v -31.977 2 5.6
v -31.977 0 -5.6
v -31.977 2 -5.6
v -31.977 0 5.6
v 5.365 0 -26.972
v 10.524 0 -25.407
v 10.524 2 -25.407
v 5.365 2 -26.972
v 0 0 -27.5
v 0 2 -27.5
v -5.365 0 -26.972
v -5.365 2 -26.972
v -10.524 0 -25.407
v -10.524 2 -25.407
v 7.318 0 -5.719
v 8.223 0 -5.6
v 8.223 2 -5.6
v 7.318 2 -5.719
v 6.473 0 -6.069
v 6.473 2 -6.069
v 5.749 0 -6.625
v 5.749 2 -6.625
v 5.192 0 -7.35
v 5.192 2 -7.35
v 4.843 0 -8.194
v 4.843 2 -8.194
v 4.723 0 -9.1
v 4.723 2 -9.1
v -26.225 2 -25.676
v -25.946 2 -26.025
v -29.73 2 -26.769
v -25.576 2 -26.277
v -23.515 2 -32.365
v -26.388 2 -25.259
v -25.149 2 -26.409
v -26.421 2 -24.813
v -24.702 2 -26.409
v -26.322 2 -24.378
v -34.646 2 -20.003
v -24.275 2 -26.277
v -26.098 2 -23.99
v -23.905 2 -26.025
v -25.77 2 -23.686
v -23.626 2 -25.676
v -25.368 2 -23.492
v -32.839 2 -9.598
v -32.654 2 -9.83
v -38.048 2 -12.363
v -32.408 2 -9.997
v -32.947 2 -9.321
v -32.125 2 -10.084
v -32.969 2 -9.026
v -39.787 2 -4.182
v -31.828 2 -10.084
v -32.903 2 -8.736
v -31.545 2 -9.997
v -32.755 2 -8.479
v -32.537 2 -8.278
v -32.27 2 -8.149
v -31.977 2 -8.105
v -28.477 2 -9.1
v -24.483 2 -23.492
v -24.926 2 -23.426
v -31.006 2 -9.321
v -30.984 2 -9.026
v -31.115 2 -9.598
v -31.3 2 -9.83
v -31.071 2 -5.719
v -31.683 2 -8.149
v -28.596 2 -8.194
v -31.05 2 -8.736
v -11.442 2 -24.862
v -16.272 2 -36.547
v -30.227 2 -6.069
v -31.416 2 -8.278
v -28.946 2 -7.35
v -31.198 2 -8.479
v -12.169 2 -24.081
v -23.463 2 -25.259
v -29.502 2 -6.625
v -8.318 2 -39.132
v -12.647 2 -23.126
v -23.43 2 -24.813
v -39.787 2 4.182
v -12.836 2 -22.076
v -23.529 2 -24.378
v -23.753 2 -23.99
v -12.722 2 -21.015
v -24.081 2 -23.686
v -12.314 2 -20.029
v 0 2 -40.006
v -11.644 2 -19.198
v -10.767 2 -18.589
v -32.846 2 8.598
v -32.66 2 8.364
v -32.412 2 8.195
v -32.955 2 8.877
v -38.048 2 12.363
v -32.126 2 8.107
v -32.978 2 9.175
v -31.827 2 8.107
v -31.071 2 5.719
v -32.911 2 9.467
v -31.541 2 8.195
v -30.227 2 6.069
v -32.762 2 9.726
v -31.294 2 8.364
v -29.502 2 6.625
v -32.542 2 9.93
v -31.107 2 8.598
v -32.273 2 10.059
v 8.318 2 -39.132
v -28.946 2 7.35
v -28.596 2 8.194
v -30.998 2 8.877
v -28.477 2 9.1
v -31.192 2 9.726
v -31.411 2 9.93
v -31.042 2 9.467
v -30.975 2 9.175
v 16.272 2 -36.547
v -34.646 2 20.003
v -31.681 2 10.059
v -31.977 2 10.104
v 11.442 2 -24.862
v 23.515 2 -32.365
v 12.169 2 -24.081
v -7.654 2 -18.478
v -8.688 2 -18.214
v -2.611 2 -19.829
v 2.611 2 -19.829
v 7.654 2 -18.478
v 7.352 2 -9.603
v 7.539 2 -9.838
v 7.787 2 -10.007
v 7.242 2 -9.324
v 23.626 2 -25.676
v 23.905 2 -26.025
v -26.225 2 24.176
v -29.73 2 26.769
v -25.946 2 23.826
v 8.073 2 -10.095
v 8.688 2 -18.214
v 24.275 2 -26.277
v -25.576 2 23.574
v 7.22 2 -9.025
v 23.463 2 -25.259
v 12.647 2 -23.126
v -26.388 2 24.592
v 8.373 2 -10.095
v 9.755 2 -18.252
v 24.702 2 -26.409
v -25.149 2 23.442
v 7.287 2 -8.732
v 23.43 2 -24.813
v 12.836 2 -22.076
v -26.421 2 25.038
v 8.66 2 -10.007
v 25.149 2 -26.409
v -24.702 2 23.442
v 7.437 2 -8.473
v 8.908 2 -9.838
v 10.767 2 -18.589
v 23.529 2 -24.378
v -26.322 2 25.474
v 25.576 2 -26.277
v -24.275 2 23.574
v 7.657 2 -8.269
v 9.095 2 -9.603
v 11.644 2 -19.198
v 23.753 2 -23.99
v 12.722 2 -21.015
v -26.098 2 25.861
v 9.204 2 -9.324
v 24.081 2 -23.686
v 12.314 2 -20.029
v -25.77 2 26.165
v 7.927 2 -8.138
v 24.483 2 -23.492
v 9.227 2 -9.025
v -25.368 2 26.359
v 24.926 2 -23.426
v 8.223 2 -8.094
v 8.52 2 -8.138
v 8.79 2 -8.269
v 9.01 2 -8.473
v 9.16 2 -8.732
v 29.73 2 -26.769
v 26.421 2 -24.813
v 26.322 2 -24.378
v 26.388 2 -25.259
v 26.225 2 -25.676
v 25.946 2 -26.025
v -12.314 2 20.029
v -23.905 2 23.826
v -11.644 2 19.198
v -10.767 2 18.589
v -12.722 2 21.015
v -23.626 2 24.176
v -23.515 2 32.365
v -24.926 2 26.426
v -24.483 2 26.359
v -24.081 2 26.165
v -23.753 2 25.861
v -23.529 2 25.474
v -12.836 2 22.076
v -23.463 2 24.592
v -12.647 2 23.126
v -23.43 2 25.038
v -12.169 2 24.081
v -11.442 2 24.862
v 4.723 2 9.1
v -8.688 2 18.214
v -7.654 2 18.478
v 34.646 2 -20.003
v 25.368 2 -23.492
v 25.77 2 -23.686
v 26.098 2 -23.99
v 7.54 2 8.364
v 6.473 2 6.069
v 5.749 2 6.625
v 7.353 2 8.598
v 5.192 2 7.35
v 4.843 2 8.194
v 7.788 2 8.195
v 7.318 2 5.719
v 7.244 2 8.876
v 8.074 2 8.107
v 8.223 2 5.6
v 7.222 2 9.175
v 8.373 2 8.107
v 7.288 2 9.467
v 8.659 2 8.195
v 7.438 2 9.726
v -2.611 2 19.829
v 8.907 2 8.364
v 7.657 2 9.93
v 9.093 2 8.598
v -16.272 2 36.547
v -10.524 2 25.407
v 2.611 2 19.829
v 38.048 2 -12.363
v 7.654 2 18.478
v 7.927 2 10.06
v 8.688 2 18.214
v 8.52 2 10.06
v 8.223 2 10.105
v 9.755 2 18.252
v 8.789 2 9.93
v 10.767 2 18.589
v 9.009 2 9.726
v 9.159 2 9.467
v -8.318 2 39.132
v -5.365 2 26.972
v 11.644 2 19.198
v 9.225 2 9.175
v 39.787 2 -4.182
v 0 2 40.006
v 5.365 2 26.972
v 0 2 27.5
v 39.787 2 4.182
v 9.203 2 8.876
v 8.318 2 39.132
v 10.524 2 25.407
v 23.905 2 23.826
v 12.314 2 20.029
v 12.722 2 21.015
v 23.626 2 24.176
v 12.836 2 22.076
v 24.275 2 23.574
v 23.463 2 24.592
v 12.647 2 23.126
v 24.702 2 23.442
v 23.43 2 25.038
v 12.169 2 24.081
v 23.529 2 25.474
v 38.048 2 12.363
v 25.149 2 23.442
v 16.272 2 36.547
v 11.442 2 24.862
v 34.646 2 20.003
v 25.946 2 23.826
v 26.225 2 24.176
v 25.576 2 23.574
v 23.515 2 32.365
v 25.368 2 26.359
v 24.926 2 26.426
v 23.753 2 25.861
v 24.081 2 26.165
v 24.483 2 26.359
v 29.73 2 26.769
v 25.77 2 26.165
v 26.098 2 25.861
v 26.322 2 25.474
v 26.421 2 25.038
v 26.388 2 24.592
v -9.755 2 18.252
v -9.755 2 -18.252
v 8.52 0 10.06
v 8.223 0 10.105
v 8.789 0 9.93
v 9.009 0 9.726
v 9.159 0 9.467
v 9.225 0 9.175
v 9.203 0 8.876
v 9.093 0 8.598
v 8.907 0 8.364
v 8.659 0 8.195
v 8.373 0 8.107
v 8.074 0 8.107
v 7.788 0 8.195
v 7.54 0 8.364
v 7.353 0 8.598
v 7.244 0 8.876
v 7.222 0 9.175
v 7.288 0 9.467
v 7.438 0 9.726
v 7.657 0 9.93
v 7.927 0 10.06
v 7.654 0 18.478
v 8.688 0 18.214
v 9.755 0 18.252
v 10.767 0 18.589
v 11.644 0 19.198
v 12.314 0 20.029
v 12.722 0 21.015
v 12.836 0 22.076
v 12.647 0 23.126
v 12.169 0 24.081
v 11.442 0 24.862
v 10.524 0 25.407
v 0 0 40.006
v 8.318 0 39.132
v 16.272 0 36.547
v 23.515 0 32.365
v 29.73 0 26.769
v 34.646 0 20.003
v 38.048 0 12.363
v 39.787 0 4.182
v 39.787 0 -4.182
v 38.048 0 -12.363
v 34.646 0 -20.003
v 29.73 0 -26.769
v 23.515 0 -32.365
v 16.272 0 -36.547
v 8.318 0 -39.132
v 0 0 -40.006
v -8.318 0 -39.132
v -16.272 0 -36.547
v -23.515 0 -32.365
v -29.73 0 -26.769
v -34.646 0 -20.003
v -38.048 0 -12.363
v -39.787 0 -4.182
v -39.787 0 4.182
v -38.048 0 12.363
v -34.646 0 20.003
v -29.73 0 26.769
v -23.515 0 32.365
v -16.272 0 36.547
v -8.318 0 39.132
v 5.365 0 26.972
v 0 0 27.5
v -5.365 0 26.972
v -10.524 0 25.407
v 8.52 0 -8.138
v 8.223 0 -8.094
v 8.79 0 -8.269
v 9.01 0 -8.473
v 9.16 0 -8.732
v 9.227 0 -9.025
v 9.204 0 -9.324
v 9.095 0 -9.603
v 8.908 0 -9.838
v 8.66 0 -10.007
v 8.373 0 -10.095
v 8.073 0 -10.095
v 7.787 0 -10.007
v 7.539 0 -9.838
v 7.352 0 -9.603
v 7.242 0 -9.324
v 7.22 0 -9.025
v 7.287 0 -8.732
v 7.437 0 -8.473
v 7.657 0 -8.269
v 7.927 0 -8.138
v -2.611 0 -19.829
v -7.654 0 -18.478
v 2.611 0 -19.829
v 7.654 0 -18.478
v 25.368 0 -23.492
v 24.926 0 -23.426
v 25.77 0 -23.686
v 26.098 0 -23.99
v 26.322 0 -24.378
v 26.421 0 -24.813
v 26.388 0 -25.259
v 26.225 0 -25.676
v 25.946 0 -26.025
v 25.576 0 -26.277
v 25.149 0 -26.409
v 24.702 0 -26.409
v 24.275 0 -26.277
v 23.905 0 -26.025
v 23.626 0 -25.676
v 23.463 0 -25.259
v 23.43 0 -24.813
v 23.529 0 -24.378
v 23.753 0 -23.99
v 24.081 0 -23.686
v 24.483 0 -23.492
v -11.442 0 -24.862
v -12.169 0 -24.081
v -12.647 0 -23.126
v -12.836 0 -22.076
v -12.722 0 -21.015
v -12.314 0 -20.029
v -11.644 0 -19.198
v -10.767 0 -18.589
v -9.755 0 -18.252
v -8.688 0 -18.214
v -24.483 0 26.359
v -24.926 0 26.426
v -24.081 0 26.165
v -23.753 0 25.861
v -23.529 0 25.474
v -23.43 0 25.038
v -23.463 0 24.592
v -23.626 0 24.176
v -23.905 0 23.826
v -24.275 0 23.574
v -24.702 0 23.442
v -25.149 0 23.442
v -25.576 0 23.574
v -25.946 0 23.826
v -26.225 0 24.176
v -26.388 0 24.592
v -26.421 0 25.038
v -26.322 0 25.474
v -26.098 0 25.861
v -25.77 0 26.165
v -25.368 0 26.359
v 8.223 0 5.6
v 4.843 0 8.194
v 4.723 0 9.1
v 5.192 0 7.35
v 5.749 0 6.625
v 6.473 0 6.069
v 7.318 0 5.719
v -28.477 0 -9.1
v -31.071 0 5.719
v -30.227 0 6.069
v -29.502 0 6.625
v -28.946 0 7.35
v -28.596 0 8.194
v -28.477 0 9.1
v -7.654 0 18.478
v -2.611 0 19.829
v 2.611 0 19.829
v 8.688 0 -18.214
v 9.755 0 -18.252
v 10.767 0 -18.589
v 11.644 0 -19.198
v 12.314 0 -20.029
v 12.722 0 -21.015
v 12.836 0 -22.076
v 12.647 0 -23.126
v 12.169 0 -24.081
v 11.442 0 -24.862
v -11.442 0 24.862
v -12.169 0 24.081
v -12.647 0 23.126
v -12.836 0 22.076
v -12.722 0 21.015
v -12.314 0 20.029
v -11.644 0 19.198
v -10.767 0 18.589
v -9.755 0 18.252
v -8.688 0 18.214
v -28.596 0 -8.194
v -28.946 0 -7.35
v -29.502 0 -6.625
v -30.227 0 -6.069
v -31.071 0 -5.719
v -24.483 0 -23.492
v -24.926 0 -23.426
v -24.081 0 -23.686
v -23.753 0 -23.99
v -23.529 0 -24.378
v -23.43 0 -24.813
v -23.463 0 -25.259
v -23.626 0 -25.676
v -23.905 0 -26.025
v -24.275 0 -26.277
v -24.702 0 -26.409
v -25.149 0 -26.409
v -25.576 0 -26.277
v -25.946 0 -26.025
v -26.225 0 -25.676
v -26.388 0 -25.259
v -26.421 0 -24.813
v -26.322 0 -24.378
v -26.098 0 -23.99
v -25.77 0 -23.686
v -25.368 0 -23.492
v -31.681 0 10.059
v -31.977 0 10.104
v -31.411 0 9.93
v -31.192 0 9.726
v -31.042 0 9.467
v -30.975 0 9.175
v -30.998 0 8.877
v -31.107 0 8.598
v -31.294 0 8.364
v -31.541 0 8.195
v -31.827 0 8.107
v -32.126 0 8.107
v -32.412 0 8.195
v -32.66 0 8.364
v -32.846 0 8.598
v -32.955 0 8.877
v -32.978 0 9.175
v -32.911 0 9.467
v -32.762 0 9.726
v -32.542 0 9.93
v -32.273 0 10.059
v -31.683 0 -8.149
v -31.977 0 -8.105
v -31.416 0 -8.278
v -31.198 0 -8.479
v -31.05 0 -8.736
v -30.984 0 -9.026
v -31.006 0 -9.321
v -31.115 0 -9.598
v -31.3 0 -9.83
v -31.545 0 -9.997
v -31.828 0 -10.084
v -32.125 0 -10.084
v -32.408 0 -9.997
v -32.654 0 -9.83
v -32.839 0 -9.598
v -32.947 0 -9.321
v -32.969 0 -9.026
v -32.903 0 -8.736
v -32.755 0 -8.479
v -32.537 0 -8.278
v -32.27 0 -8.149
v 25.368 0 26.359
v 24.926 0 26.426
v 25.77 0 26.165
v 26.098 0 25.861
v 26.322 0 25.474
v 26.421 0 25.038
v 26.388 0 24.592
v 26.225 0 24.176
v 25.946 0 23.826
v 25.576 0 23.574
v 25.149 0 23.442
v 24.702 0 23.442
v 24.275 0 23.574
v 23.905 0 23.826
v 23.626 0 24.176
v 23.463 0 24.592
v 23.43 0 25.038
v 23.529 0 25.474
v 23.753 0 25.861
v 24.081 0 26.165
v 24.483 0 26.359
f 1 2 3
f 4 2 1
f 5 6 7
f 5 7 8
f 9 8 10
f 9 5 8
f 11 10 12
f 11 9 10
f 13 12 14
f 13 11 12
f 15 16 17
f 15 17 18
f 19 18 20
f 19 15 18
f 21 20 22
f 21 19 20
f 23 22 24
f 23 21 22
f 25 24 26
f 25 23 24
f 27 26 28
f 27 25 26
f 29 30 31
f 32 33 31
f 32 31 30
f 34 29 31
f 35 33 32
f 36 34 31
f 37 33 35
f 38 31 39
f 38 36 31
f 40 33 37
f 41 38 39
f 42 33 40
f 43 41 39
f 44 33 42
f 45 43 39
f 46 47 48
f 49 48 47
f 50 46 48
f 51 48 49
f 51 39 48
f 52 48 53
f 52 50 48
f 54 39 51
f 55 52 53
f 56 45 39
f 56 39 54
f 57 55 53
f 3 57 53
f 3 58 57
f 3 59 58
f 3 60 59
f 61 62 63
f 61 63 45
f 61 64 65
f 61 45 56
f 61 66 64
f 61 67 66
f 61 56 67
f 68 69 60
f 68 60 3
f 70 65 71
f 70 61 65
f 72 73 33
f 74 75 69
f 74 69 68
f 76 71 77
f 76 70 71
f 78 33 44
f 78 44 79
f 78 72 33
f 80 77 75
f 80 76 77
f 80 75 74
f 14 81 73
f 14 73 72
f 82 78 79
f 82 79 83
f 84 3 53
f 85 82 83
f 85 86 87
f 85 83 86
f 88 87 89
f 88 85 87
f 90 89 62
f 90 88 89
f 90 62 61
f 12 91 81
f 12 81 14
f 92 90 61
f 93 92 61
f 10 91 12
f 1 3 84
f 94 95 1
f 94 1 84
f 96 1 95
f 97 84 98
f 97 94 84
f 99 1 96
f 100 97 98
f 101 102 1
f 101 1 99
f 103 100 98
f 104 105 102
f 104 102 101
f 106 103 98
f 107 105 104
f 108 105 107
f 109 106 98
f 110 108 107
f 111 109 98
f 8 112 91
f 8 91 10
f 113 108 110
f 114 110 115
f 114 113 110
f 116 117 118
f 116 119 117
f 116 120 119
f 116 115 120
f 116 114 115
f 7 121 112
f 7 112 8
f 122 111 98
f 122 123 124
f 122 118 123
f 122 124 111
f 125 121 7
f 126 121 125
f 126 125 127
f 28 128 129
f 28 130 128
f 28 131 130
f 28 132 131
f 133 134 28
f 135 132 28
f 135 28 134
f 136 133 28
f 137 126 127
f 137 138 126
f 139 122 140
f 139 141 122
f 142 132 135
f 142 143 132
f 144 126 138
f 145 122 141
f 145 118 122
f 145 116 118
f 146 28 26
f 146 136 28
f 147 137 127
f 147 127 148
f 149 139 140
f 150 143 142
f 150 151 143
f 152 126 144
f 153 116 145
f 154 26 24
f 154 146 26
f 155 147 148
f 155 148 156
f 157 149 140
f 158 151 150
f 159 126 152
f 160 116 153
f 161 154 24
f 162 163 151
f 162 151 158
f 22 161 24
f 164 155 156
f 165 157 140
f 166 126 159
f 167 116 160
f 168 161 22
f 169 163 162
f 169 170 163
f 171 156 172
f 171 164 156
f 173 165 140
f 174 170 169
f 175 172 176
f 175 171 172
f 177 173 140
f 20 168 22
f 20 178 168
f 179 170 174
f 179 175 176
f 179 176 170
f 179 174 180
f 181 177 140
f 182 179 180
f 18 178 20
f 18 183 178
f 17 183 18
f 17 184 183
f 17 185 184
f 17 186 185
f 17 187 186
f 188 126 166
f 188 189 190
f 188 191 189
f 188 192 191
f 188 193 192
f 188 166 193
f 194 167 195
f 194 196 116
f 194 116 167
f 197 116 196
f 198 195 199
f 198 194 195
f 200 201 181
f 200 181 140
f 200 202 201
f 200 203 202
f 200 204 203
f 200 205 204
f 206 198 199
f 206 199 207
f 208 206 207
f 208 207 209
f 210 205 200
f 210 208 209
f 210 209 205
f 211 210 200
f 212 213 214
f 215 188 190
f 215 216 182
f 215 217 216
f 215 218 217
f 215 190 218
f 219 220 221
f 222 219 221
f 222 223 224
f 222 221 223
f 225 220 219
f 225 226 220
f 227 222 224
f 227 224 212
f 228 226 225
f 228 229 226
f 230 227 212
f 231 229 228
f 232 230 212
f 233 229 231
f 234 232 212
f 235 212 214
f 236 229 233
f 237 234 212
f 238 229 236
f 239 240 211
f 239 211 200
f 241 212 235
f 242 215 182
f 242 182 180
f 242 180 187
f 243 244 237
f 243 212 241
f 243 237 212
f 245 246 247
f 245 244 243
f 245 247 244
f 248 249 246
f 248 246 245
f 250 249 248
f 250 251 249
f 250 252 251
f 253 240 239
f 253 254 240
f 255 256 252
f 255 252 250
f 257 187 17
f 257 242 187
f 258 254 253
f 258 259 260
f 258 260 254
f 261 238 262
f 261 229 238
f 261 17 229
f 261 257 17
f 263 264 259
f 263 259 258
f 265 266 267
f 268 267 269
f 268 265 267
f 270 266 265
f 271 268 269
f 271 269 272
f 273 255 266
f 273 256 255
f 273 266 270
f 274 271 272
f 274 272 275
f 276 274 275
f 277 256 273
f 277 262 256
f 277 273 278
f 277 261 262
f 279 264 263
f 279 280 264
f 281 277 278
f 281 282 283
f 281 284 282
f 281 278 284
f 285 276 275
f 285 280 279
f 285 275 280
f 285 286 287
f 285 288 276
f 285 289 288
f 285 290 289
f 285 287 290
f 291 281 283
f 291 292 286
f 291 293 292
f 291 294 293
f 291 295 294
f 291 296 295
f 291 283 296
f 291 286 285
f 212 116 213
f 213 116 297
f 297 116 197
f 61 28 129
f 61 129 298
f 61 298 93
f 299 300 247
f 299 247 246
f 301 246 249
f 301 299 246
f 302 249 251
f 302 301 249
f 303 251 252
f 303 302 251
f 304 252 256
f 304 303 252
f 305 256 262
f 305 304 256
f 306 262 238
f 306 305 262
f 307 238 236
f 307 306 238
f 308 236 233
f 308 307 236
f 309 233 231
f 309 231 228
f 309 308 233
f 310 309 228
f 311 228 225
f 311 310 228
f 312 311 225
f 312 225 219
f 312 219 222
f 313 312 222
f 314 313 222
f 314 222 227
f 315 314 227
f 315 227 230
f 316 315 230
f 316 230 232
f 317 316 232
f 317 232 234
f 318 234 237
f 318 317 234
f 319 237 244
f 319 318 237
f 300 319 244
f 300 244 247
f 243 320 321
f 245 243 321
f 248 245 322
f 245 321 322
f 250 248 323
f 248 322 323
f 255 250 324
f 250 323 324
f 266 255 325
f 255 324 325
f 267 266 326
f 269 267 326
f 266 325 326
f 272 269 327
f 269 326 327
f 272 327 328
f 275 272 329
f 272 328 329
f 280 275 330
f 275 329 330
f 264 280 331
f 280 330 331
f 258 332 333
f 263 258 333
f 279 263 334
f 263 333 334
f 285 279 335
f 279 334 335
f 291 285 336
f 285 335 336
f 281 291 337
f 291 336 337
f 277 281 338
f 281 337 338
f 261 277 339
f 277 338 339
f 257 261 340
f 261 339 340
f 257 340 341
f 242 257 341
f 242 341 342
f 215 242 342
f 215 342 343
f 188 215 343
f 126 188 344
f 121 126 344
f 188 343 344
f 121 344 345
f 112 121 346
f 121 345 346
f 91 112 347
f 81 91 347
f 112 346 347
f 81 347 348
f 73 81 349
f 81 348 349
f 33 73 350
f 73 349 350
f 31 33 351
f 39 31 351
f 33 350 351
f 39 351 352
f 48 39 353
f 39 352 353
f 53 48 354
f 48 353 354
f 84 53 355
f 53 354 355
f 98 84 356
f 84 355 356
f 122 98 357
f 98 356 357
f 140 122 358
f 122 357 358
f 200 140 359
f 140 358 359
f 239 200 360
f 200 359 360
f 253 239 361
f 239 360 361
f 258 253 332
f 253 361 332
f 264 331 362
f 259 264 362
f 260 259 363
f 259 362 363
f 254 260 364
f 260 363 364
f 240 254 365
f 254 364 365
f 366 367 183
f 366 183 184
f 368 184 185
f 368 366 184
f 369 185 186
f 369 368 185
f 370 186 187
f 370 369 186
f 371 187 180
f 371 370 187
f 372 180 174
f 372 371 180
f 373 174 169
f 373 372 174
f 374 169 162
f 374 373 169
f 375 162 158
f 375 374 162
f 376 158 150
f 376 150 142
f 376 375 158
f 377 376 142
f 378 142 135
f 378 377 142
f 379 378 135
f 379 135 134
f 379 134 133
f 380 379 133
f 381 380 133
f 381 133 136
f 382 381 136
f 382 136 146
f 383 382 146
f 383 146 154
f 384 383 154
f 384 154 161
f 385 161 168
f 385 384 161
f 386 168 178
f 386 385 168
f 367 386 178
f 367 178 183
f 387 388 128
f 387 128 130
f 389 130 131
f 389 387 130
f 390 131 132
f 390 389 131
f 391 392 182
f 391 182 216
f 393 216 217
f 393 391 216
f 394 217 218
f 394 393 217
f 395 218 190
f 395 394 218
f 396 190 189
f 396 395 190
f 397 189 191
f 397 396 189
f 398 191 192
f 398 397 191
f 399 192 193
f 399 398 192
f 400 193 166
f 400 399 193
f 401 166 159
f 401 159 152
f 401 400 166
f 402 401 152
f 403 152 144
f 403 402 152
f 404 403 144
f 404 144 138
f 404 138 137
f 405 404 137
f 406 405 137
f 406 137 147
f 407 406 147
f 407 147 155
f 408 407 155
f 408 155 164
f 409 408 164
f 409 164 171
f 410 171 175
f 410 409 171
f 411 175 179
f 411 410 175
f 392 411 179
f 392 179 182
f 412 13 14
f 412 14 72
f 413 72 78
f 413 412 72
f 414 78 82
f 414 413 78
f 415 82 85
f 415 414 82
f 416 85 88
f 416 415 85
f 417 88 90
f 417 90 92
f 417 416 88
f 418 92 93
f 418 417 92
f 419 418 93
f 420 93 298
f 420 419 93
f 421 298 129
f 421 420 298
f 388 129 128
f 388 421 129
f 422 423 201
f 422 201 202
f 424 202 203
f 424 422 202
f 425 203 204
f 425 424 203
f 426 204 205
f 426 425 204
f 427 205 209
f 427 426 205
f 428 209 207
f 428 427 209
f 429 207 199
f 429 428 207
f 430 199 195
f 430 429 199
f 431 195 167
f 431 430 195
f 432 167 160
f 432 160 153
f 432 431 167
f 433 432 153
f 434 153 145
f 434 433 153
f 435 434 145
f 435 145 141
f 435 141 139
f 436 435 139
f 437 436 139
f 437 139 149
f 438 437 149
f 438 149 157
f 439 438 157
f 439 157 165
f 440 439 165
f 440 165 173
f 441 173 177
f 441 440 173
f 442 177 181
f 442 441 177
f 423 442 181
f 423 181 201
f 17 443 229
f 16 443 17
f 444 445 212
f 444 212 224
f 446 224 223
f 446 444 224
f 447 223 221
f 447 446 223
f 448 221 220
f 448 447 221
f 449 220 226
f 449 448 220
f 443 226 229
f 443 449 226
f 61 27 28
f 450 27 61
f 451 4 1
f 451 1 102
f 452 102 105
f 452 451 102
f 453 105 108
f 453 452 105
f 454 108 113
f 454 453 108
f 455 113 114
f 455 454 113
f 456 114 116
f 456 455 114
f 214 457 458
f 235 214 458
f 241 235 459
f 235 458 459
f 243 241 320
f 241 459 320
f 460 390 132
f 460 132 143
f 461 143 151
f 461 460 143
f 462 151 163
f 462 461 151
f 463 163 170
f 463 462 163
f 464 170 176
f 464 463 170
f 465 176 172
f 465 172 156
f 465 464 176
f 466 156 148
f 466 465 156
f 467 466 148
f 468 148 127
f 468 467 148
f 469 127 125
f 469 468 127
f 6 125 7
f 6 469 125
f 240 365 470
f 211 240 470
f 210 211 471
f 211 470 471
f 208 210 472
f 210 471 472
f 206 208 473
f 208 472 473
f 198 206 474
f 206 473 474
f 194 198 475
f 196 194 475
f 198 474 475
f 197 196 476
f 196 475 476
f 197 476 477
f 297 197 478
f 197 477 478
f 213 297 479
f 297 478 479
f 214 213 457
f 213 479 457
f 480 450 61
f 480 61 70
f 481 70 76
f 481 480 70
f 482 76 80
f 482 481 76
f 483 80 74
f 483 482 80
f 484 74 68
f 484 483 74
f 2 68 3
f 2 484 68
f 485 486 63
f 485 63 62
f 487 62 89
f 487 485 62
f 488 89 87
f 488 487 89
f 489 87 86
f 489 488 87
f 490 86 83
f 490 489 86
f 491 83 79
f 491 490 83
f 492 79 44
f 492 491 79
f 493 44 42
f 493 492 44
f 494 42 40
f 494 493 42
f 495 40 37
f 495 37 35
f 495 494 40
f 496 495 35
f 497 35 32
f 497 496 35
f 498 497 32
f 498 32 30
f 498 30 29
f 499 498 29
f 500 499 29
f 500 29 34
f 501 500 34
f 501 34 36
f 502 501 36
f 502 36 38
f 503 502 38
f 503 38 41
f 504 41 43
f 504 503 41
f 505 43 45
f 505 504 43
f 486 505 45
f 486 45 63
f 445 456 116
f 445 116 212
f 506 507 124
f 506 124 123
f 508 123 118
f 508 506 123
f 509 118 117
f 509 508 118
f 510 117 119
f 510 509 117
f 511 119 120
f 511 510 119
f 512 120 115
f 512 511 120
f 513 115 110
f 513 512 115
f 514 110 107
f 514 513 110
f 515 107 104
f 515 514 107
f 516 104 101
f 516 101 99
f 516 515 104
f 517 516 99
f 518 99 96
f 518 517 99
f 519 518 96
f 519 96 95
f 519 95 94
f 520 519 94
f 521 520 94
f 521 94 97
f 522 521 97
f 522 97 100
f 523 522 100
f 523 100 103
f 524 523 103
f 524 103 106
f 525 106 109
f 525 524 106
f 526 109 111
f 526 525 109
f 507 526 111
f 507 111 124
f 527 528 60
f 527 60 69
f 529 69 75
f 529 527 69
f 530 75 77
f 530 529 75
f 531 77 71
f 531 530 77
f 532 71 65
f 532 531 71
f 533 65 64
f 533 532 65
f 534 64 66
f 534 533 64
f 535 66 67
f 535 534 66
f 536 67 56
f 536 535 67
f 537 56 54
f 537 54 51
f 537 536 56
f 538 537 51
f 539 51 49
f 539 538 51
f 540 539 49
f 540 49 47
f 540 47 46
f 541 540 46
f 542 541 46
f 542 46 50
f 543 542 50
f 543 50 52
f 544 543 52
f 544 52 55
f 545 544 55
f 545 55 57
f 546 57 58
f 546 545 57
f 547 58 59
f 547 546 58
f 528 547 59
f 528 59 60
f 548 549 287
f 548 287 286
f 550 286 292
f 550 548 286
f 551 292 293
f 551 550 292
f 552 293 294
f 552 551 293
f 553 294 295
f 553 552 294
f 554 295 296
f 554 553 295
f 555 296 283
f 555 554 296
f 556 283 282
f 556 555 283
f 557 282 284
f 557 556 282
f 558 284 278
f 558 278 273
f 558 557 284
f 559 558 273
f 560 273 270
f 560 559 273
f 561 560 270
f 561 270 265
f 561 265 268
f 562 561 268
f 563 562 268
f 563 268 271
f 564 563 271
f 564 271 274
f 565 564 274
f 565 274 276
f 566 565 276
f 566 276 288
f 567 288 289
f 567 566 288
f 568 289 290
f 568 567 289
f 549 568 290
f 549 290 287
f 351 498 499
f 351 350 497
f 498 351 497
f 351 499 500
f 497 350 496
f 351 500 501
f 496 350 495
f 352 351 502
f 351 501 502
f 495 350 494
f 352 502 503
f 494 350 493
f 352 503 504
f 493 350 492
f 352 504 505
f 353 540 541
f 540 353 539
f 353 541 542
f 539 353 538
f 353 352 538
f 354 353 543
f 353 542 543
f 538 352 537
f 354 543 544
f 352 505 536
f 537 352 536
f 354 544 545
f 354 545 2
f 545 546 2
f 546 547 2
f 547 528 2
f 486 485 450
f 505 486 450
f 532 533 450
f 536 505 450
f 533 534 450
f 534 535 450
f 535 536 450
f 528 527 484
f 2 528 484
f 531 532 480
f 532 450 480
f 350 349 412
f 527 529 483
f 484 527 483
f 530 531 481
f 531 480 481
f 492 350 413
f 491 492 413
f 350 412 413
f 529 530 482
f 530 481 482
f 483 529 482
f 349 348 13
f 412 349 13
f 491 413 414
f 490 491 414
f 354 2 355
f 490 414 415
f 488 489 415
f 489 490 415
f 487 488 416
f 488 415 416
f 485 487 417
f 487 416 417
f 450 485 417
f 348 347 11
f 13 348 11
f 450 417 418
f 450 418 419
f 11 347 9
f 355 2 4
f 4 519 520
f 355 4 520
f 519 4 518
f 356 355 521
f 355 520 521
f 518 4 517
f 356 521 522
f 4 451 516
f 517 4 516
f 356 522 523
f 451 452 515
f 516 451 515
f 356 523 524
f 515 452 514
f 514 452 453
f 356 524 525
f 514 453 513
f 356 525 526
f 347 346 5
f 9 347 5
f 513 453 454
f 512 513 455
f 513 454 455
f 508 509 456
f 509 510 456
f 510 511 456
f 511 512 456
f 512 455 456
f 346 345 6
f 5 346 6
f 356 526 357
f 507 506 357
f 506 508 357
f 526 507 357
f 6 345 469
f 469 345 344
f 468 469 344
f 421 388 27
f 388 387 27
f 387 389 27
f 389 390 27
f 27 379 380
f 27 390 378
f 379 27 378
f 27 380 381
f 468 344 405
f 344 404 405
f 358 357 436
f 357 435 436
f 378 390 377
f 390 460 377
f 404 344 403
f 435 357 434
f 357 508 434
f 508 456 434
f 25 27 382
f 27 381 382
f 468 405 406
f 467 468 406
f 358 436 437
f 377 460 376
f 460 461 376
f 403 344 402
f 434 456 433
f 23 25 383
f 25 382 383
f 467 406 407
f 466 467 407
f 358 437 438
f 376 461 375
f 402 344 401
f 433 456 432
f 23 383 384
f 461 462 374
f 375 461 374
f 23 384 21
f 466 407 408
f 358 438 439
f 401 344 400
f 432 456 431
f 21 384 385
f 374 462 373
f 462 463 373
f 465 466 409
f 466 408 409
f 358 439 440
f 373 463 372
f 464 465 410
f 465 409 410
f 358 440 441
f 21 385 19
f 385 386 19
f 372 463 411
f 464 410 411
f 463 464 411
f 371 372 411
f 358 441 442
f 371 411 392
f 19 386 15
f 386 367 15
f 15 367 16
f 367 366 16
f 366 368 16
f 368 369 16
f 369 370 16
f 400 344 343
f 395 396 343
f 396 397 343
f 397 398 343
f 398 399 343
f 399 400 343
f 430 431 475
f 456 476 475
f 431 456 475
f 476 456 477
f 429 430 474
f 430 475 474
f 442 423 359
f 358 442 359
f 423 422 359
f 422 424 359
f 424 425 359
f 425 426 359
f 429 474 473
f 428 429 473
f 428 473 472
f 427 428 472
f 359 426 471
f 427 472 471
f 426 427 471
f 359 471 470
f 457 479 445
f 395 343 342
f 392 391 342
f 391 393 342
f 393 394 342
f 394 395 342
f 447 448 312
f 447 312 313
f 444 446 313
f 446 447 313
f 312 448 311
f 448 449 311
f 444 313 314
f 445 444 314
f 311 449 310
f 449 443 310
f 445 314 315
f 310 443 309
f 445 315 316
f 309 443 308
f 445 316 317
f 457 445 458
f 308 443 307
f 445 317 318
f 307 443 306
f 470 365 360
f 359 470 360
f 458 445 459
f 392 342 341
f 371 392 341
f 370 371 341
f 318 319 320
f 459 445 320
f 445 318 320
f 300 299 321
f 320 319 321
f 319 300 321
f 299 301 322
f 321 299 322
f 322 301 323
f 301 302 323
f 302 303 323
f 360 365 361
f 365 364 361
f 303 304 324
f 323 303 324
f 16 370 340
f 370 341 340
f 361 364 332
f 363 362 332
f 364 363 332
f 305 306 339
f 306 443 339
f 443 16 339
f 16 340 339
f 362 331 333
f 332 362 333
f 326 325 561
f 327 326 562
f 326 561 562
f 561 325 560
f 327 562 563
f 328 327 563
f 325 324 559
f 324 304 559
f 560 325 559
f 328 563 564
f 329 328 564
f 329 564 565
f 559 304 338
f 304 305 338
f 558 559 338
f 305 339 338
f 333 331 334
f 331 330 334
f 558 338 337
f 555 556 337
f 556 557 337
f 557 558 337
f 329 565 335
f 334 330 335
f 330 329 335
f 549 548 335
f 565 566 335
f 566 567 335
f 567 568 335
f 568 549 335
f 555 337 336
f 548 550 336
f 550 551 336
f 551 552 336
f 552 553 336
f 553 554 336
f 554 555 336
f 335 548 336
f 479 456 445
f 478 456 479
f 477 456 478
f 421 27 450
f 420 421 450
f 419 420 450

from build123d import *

# Parameters (mm, degrees)
CROQUIS2_R              = 40.005937341
CROQUIS2_R_2            = 0.995391995
CROQUIS2_R_3            = 1.004055524
CROQUIS2_R_4            = 1.00622676
CROQUIS2_R_5            = 1.004640813
CROQUIS2_R_6            = 1.5
SALIENTE_EXTRUIR1_DEPTH = 2


with BuildPart() as part:
    # Croquis2 → Saliente-Extruir1 (new body)
    with BuildSketch(Plane(origin=(0, 0, 0), x_dir=(1, 0, 0), z_dir=(0, 1, 0))):
        with Locations(Location((0, 0, 0), (0, 0, 270))):
            Circle(CROQUIS2_R)
        with Locations(Location((-31.9766, 9.1, 0), (0, 0, 270))):
            Circle(CROQUIS2_R_2, mode=Mode.SUBTRACT)
        with Locations(Location((-31.9766, -9.1, 0), (0, 0, 270))):
            Circle(CROQUIS2_R_3, mode=Mode.SUBTRACT)
        with Locations(Location((8.2234, 9.1, 0), (0, 0, 270))):
            Circle(CROQUIS2_R_4, mode=Mode.SUBTRACT)
        with Locations(Location((8.2234, -9.1, 0), (0, 0, 270))):
            Circle(CROQUIS2_R_5, mode=Mode.SUBTRACT)
        with Locations(Location((-24.925514037, 24.925514037, 0), (0, 0, 270))):
            Circle(CROQUIS2_R_6, mode=Mode.SUBTRACT)
        with Locations(Location((24.925514037, 24.925514037, 0), (0, 0, 270))):
            Circle(CROQUIS2_R_6, mode=Mode.SUBTRACT)
        with Locations(Location((24.925514037, -24.925514037, 0), (0, 0, 270))):
            Circle(CROQUIS2_R_6, mode=Mode.SUBTRACT)
        with Locations(Location((-24.925514037, -24.925514037, 0), (0, 0, 270))):
            Circle(CROQUIS2_R_6, mode=Mode.SUBTRACT)
        with BuildLine():
            Line((-28.4766, -9.1), (4.7234, -9.1))
            ThreePointArc((4.7234, -9.1), (5.748526266, -6.625126266), (8.2234, -5.6))
            Line((8.2234, -5.6), (8.2234, 5.6))
            ThreePointArc((8.2234, 5.6), (5.748526266, 6.625126266), (4.7234, 9.1))
            Line((4.7234, 9.1), (-28.4766, 9.1))
            ThreePointArc((-28.4766, 9.1), (-29.501726266, 6.625126266), (-31.9766, 5.6))
            Line((-31.9766, 5.6), (-31.9766, -5.6))
            ThreePointArc((-31.9766, -5.6), (-29.501726266, -6.625126266), (-28.4766, -9.1))
        make_face(mode=Mode.SUBTRACT)
        with BuildLine():
            ThreePointArc((-7.653668647, -18.47759065), (0, -20), (7.653668647, -18.47759065))
            ThreePointArc((7.653668647, -18.47759065), (12.553279766, -20.507076026), (10.52379439, -25.406687144))
            ThreePointArc((10.52379439, -25.406687144), (0, -27.5), (-10.52379439, -25.406687144))
            ThreePointArc((-10.52379439, -25.406687144), (-12.553279766, -20.507076026), (-7.653668647, -18.47759065))
        make_face(mode=Mode.SUBTRACT)
        with BuildLine():
            ThreePointArc((-10.52379439, 25.406687144), (-12.553279766, 20.507076026), (-7.653668647, 18.47759065))
            ThreePointArc((-7.653668647, 18.47759065), (0, 20), (7.653668647, 18.47759065))
            ThreePointArc((7.653668647, 18.47759065), (12.553279766, 20.507076026), (10.52379439, 25.406687144))
            ThreePointArc((10.52379439, 25.406687144), (0, 27.5), (-10.52379439, 25.406687144))
        make_face(mode=Mode.SUBTRACT)
    extrude(amount=SALIENTE_EXTRUIR1_DEPTH)


solid = part.part
